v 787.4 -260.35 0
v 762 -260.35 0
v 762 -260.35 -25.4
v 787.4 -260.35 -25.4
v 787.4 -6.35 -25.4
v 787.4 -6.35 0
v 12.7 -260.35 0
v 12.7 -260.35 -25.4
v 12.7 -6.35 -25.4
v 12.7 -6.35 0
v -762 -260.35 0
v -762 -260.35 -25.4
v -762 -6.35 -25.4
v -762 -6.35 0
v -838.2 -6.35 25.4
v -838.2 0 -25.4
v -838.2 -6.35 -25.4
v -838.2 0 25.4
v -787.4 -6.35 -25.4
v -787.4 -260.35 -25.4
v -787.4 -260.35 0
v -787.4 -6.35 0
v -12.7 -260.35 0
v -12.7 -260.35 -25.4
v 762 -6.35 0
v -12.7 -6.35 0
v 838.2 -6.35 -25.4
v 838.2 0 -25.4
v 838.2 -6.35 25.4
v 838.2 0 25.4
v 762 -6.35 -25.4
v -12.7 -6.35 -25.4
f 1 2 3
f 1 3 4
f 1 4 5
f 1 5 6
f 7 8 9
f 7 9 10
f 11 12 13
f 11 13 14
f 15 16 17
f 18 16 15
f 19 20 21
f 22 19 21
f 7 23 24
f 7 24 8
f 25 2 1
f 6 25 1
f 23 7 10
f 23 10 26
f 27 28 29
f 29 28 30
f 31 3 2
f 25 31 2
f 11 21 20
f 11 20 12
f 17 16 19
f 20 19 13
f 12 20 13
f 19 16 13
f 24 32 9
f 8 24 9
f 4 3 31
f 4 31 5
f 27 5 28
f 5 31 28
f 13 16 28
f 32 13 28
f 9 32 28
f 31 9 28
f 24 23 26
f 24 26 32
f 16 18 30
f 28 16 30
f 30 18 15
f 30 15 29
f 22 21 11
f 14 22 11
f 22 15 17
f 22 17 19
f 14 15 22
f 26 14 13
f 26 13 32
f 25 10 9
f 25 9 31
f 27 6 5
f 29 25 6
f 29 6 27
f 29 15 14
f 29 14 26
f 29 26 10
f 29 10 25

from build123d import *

# Parameters (mm, degrees)
F0_W     = 1676.4
F0_H     = 50.8
F1_DEPTH = 6.35
F2_W     = 25.4
F2_H     = 25.4
F3_DEPTH = 254


with BuildPart() as f1:
    # F0 (on Front) → F1 (new body)
    with BuildSketch(Plane.XZ):
        Rectangle(F0_W, F0_H)
    extrude(amount=F1_DEPTH)

    # F2 (on face) → F3 (join)
    with BuildSketch(Plane.XZ.offset(6.35)):
        with Locations((-774.7, -12.7)):
            Rectangle(F2_W, F2_H)
        with Locations((774.7, -12.7)):
            Rectangle(F2_W, F2_H)
        Polygon((-12.7, 0), (-12.7, -25.4), (0, -25.4), (12.7, -25.4), (12.7, 0), (0, 0), align=None)
    extrude(amount=F3_DEPTH)


solid = f1.part
